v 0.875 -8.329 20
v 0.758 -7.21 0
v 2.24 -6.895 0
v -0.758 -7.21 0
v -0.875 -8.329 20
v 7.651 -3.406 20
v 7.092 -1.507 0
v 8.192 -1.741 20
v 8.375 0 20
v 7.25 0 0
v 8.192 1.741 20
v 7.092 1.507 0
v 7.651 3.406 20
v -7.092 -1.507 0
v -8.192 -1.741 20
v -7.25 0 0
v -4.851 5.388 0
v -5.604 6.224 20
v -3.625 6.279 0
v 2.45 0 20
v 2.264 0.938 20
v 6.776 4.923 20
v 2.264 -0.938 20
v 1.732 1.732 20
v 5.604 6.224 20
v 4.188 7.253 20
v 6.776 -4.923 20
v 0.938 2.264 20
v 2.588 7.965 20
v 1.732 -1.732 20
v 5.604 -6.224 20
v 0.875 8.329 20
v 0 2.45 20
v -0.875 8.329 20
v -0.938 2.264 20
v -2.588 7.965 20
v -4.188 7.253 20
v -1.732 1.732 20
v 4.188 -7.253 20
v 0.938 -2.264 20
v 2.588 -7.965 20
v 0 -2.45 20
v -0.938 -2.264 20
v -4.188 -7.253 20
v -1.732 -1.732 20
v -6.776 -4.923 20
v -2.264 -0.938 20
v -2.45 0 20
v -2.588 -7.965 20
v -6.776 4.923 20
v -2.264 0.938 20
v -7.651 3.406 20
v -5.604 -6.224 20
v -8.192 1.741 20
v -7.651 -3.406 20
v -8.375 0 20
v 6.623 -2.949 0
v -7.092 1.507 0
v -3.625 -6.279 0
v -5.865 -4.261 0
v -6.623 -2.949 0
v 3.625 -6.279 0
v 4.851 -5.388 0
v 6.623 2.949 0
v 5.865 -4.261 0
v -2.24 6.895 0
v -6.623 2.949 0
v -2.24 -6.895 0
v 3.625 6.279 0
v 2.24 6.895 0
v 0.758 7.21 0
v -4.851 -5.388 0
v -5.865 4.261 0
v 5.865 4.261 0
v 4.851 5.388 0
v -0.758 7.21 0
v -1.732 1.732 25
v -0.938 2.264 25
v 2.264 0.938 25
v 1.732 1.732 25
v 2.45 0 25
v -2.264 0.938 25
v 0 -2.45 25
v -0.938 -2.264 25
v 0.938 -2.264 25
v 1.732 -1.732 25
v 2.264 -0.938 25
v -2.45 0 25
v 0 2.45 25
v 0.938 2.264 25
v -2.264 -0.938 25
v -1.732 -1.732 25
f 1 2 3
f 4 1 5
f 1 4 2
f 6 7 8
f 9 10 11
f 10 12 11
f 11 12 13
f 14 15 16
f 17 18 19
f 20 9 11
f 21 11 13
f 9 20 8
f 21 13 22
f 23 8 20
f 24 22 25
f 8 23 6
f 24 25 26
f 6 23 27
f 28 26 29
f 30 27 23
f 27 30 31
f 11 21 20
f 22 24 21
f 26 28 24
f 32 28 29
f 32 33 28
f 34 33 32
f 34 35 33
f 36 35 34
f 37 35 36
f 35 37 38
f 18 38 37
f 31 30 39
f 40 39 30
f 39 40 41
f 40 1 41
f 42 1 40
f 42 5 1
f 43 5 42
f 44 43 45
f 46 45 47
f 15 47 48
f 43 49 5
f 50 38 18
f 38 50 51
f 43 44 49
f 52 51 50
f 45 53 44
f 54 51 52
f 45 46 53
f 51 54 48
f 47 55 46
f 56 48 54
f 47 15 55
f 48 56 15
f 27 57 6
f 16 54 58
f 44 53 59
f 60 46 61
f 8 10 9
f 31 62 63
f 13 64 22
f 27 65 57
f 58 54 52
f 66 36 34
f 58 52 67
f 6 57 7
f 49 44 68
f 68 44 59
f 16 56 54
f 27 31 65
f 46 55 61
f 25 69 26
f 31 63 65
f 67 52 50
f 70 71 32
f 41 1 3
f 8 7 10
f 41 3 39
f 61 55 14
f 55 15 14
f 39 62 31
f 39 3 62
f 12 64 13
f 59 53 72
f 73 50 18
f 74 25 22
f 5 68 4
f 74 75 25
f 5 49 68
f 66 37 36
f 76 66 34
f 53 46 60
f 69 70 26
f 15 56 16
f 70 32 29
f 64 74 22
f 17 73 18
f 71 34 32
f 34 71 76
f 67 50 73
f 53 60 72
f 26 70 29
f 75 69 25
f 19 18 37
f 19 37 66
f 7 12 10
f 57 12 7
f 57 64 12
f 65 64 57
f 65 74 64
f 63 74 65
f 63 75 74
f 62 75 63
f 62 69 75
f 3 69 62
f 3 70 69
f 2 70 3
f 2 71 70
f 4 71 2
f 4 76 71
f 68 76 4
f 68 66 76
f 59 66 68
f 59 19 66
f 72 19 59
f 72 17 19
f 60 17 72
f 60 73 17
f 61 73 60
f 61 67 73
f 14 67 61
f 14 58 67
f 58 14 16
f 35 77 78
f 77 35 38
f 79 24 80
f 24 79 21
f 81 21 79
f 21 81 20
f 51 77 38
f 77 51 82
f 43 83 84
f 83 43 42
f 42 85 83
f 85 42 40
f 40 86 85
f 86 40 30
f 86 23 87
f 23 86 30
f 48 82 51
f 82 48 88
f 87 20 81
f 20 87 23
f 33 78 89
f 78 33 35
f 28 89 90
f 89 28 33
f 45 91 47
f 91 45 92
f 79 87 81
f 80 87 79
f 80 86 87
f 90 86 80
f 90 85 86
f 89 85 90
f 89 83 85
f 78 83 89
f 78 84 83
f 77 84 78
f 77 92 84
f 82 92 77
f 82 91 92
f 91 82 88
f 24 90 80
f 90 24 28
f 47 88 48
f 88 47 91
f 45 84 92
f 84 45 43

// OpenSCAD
$fs=1;

cylinder(d1=14.5, d2=16.75, h=20);
translate([0,0,20])
	cylinder(d=4.9, h=5);
